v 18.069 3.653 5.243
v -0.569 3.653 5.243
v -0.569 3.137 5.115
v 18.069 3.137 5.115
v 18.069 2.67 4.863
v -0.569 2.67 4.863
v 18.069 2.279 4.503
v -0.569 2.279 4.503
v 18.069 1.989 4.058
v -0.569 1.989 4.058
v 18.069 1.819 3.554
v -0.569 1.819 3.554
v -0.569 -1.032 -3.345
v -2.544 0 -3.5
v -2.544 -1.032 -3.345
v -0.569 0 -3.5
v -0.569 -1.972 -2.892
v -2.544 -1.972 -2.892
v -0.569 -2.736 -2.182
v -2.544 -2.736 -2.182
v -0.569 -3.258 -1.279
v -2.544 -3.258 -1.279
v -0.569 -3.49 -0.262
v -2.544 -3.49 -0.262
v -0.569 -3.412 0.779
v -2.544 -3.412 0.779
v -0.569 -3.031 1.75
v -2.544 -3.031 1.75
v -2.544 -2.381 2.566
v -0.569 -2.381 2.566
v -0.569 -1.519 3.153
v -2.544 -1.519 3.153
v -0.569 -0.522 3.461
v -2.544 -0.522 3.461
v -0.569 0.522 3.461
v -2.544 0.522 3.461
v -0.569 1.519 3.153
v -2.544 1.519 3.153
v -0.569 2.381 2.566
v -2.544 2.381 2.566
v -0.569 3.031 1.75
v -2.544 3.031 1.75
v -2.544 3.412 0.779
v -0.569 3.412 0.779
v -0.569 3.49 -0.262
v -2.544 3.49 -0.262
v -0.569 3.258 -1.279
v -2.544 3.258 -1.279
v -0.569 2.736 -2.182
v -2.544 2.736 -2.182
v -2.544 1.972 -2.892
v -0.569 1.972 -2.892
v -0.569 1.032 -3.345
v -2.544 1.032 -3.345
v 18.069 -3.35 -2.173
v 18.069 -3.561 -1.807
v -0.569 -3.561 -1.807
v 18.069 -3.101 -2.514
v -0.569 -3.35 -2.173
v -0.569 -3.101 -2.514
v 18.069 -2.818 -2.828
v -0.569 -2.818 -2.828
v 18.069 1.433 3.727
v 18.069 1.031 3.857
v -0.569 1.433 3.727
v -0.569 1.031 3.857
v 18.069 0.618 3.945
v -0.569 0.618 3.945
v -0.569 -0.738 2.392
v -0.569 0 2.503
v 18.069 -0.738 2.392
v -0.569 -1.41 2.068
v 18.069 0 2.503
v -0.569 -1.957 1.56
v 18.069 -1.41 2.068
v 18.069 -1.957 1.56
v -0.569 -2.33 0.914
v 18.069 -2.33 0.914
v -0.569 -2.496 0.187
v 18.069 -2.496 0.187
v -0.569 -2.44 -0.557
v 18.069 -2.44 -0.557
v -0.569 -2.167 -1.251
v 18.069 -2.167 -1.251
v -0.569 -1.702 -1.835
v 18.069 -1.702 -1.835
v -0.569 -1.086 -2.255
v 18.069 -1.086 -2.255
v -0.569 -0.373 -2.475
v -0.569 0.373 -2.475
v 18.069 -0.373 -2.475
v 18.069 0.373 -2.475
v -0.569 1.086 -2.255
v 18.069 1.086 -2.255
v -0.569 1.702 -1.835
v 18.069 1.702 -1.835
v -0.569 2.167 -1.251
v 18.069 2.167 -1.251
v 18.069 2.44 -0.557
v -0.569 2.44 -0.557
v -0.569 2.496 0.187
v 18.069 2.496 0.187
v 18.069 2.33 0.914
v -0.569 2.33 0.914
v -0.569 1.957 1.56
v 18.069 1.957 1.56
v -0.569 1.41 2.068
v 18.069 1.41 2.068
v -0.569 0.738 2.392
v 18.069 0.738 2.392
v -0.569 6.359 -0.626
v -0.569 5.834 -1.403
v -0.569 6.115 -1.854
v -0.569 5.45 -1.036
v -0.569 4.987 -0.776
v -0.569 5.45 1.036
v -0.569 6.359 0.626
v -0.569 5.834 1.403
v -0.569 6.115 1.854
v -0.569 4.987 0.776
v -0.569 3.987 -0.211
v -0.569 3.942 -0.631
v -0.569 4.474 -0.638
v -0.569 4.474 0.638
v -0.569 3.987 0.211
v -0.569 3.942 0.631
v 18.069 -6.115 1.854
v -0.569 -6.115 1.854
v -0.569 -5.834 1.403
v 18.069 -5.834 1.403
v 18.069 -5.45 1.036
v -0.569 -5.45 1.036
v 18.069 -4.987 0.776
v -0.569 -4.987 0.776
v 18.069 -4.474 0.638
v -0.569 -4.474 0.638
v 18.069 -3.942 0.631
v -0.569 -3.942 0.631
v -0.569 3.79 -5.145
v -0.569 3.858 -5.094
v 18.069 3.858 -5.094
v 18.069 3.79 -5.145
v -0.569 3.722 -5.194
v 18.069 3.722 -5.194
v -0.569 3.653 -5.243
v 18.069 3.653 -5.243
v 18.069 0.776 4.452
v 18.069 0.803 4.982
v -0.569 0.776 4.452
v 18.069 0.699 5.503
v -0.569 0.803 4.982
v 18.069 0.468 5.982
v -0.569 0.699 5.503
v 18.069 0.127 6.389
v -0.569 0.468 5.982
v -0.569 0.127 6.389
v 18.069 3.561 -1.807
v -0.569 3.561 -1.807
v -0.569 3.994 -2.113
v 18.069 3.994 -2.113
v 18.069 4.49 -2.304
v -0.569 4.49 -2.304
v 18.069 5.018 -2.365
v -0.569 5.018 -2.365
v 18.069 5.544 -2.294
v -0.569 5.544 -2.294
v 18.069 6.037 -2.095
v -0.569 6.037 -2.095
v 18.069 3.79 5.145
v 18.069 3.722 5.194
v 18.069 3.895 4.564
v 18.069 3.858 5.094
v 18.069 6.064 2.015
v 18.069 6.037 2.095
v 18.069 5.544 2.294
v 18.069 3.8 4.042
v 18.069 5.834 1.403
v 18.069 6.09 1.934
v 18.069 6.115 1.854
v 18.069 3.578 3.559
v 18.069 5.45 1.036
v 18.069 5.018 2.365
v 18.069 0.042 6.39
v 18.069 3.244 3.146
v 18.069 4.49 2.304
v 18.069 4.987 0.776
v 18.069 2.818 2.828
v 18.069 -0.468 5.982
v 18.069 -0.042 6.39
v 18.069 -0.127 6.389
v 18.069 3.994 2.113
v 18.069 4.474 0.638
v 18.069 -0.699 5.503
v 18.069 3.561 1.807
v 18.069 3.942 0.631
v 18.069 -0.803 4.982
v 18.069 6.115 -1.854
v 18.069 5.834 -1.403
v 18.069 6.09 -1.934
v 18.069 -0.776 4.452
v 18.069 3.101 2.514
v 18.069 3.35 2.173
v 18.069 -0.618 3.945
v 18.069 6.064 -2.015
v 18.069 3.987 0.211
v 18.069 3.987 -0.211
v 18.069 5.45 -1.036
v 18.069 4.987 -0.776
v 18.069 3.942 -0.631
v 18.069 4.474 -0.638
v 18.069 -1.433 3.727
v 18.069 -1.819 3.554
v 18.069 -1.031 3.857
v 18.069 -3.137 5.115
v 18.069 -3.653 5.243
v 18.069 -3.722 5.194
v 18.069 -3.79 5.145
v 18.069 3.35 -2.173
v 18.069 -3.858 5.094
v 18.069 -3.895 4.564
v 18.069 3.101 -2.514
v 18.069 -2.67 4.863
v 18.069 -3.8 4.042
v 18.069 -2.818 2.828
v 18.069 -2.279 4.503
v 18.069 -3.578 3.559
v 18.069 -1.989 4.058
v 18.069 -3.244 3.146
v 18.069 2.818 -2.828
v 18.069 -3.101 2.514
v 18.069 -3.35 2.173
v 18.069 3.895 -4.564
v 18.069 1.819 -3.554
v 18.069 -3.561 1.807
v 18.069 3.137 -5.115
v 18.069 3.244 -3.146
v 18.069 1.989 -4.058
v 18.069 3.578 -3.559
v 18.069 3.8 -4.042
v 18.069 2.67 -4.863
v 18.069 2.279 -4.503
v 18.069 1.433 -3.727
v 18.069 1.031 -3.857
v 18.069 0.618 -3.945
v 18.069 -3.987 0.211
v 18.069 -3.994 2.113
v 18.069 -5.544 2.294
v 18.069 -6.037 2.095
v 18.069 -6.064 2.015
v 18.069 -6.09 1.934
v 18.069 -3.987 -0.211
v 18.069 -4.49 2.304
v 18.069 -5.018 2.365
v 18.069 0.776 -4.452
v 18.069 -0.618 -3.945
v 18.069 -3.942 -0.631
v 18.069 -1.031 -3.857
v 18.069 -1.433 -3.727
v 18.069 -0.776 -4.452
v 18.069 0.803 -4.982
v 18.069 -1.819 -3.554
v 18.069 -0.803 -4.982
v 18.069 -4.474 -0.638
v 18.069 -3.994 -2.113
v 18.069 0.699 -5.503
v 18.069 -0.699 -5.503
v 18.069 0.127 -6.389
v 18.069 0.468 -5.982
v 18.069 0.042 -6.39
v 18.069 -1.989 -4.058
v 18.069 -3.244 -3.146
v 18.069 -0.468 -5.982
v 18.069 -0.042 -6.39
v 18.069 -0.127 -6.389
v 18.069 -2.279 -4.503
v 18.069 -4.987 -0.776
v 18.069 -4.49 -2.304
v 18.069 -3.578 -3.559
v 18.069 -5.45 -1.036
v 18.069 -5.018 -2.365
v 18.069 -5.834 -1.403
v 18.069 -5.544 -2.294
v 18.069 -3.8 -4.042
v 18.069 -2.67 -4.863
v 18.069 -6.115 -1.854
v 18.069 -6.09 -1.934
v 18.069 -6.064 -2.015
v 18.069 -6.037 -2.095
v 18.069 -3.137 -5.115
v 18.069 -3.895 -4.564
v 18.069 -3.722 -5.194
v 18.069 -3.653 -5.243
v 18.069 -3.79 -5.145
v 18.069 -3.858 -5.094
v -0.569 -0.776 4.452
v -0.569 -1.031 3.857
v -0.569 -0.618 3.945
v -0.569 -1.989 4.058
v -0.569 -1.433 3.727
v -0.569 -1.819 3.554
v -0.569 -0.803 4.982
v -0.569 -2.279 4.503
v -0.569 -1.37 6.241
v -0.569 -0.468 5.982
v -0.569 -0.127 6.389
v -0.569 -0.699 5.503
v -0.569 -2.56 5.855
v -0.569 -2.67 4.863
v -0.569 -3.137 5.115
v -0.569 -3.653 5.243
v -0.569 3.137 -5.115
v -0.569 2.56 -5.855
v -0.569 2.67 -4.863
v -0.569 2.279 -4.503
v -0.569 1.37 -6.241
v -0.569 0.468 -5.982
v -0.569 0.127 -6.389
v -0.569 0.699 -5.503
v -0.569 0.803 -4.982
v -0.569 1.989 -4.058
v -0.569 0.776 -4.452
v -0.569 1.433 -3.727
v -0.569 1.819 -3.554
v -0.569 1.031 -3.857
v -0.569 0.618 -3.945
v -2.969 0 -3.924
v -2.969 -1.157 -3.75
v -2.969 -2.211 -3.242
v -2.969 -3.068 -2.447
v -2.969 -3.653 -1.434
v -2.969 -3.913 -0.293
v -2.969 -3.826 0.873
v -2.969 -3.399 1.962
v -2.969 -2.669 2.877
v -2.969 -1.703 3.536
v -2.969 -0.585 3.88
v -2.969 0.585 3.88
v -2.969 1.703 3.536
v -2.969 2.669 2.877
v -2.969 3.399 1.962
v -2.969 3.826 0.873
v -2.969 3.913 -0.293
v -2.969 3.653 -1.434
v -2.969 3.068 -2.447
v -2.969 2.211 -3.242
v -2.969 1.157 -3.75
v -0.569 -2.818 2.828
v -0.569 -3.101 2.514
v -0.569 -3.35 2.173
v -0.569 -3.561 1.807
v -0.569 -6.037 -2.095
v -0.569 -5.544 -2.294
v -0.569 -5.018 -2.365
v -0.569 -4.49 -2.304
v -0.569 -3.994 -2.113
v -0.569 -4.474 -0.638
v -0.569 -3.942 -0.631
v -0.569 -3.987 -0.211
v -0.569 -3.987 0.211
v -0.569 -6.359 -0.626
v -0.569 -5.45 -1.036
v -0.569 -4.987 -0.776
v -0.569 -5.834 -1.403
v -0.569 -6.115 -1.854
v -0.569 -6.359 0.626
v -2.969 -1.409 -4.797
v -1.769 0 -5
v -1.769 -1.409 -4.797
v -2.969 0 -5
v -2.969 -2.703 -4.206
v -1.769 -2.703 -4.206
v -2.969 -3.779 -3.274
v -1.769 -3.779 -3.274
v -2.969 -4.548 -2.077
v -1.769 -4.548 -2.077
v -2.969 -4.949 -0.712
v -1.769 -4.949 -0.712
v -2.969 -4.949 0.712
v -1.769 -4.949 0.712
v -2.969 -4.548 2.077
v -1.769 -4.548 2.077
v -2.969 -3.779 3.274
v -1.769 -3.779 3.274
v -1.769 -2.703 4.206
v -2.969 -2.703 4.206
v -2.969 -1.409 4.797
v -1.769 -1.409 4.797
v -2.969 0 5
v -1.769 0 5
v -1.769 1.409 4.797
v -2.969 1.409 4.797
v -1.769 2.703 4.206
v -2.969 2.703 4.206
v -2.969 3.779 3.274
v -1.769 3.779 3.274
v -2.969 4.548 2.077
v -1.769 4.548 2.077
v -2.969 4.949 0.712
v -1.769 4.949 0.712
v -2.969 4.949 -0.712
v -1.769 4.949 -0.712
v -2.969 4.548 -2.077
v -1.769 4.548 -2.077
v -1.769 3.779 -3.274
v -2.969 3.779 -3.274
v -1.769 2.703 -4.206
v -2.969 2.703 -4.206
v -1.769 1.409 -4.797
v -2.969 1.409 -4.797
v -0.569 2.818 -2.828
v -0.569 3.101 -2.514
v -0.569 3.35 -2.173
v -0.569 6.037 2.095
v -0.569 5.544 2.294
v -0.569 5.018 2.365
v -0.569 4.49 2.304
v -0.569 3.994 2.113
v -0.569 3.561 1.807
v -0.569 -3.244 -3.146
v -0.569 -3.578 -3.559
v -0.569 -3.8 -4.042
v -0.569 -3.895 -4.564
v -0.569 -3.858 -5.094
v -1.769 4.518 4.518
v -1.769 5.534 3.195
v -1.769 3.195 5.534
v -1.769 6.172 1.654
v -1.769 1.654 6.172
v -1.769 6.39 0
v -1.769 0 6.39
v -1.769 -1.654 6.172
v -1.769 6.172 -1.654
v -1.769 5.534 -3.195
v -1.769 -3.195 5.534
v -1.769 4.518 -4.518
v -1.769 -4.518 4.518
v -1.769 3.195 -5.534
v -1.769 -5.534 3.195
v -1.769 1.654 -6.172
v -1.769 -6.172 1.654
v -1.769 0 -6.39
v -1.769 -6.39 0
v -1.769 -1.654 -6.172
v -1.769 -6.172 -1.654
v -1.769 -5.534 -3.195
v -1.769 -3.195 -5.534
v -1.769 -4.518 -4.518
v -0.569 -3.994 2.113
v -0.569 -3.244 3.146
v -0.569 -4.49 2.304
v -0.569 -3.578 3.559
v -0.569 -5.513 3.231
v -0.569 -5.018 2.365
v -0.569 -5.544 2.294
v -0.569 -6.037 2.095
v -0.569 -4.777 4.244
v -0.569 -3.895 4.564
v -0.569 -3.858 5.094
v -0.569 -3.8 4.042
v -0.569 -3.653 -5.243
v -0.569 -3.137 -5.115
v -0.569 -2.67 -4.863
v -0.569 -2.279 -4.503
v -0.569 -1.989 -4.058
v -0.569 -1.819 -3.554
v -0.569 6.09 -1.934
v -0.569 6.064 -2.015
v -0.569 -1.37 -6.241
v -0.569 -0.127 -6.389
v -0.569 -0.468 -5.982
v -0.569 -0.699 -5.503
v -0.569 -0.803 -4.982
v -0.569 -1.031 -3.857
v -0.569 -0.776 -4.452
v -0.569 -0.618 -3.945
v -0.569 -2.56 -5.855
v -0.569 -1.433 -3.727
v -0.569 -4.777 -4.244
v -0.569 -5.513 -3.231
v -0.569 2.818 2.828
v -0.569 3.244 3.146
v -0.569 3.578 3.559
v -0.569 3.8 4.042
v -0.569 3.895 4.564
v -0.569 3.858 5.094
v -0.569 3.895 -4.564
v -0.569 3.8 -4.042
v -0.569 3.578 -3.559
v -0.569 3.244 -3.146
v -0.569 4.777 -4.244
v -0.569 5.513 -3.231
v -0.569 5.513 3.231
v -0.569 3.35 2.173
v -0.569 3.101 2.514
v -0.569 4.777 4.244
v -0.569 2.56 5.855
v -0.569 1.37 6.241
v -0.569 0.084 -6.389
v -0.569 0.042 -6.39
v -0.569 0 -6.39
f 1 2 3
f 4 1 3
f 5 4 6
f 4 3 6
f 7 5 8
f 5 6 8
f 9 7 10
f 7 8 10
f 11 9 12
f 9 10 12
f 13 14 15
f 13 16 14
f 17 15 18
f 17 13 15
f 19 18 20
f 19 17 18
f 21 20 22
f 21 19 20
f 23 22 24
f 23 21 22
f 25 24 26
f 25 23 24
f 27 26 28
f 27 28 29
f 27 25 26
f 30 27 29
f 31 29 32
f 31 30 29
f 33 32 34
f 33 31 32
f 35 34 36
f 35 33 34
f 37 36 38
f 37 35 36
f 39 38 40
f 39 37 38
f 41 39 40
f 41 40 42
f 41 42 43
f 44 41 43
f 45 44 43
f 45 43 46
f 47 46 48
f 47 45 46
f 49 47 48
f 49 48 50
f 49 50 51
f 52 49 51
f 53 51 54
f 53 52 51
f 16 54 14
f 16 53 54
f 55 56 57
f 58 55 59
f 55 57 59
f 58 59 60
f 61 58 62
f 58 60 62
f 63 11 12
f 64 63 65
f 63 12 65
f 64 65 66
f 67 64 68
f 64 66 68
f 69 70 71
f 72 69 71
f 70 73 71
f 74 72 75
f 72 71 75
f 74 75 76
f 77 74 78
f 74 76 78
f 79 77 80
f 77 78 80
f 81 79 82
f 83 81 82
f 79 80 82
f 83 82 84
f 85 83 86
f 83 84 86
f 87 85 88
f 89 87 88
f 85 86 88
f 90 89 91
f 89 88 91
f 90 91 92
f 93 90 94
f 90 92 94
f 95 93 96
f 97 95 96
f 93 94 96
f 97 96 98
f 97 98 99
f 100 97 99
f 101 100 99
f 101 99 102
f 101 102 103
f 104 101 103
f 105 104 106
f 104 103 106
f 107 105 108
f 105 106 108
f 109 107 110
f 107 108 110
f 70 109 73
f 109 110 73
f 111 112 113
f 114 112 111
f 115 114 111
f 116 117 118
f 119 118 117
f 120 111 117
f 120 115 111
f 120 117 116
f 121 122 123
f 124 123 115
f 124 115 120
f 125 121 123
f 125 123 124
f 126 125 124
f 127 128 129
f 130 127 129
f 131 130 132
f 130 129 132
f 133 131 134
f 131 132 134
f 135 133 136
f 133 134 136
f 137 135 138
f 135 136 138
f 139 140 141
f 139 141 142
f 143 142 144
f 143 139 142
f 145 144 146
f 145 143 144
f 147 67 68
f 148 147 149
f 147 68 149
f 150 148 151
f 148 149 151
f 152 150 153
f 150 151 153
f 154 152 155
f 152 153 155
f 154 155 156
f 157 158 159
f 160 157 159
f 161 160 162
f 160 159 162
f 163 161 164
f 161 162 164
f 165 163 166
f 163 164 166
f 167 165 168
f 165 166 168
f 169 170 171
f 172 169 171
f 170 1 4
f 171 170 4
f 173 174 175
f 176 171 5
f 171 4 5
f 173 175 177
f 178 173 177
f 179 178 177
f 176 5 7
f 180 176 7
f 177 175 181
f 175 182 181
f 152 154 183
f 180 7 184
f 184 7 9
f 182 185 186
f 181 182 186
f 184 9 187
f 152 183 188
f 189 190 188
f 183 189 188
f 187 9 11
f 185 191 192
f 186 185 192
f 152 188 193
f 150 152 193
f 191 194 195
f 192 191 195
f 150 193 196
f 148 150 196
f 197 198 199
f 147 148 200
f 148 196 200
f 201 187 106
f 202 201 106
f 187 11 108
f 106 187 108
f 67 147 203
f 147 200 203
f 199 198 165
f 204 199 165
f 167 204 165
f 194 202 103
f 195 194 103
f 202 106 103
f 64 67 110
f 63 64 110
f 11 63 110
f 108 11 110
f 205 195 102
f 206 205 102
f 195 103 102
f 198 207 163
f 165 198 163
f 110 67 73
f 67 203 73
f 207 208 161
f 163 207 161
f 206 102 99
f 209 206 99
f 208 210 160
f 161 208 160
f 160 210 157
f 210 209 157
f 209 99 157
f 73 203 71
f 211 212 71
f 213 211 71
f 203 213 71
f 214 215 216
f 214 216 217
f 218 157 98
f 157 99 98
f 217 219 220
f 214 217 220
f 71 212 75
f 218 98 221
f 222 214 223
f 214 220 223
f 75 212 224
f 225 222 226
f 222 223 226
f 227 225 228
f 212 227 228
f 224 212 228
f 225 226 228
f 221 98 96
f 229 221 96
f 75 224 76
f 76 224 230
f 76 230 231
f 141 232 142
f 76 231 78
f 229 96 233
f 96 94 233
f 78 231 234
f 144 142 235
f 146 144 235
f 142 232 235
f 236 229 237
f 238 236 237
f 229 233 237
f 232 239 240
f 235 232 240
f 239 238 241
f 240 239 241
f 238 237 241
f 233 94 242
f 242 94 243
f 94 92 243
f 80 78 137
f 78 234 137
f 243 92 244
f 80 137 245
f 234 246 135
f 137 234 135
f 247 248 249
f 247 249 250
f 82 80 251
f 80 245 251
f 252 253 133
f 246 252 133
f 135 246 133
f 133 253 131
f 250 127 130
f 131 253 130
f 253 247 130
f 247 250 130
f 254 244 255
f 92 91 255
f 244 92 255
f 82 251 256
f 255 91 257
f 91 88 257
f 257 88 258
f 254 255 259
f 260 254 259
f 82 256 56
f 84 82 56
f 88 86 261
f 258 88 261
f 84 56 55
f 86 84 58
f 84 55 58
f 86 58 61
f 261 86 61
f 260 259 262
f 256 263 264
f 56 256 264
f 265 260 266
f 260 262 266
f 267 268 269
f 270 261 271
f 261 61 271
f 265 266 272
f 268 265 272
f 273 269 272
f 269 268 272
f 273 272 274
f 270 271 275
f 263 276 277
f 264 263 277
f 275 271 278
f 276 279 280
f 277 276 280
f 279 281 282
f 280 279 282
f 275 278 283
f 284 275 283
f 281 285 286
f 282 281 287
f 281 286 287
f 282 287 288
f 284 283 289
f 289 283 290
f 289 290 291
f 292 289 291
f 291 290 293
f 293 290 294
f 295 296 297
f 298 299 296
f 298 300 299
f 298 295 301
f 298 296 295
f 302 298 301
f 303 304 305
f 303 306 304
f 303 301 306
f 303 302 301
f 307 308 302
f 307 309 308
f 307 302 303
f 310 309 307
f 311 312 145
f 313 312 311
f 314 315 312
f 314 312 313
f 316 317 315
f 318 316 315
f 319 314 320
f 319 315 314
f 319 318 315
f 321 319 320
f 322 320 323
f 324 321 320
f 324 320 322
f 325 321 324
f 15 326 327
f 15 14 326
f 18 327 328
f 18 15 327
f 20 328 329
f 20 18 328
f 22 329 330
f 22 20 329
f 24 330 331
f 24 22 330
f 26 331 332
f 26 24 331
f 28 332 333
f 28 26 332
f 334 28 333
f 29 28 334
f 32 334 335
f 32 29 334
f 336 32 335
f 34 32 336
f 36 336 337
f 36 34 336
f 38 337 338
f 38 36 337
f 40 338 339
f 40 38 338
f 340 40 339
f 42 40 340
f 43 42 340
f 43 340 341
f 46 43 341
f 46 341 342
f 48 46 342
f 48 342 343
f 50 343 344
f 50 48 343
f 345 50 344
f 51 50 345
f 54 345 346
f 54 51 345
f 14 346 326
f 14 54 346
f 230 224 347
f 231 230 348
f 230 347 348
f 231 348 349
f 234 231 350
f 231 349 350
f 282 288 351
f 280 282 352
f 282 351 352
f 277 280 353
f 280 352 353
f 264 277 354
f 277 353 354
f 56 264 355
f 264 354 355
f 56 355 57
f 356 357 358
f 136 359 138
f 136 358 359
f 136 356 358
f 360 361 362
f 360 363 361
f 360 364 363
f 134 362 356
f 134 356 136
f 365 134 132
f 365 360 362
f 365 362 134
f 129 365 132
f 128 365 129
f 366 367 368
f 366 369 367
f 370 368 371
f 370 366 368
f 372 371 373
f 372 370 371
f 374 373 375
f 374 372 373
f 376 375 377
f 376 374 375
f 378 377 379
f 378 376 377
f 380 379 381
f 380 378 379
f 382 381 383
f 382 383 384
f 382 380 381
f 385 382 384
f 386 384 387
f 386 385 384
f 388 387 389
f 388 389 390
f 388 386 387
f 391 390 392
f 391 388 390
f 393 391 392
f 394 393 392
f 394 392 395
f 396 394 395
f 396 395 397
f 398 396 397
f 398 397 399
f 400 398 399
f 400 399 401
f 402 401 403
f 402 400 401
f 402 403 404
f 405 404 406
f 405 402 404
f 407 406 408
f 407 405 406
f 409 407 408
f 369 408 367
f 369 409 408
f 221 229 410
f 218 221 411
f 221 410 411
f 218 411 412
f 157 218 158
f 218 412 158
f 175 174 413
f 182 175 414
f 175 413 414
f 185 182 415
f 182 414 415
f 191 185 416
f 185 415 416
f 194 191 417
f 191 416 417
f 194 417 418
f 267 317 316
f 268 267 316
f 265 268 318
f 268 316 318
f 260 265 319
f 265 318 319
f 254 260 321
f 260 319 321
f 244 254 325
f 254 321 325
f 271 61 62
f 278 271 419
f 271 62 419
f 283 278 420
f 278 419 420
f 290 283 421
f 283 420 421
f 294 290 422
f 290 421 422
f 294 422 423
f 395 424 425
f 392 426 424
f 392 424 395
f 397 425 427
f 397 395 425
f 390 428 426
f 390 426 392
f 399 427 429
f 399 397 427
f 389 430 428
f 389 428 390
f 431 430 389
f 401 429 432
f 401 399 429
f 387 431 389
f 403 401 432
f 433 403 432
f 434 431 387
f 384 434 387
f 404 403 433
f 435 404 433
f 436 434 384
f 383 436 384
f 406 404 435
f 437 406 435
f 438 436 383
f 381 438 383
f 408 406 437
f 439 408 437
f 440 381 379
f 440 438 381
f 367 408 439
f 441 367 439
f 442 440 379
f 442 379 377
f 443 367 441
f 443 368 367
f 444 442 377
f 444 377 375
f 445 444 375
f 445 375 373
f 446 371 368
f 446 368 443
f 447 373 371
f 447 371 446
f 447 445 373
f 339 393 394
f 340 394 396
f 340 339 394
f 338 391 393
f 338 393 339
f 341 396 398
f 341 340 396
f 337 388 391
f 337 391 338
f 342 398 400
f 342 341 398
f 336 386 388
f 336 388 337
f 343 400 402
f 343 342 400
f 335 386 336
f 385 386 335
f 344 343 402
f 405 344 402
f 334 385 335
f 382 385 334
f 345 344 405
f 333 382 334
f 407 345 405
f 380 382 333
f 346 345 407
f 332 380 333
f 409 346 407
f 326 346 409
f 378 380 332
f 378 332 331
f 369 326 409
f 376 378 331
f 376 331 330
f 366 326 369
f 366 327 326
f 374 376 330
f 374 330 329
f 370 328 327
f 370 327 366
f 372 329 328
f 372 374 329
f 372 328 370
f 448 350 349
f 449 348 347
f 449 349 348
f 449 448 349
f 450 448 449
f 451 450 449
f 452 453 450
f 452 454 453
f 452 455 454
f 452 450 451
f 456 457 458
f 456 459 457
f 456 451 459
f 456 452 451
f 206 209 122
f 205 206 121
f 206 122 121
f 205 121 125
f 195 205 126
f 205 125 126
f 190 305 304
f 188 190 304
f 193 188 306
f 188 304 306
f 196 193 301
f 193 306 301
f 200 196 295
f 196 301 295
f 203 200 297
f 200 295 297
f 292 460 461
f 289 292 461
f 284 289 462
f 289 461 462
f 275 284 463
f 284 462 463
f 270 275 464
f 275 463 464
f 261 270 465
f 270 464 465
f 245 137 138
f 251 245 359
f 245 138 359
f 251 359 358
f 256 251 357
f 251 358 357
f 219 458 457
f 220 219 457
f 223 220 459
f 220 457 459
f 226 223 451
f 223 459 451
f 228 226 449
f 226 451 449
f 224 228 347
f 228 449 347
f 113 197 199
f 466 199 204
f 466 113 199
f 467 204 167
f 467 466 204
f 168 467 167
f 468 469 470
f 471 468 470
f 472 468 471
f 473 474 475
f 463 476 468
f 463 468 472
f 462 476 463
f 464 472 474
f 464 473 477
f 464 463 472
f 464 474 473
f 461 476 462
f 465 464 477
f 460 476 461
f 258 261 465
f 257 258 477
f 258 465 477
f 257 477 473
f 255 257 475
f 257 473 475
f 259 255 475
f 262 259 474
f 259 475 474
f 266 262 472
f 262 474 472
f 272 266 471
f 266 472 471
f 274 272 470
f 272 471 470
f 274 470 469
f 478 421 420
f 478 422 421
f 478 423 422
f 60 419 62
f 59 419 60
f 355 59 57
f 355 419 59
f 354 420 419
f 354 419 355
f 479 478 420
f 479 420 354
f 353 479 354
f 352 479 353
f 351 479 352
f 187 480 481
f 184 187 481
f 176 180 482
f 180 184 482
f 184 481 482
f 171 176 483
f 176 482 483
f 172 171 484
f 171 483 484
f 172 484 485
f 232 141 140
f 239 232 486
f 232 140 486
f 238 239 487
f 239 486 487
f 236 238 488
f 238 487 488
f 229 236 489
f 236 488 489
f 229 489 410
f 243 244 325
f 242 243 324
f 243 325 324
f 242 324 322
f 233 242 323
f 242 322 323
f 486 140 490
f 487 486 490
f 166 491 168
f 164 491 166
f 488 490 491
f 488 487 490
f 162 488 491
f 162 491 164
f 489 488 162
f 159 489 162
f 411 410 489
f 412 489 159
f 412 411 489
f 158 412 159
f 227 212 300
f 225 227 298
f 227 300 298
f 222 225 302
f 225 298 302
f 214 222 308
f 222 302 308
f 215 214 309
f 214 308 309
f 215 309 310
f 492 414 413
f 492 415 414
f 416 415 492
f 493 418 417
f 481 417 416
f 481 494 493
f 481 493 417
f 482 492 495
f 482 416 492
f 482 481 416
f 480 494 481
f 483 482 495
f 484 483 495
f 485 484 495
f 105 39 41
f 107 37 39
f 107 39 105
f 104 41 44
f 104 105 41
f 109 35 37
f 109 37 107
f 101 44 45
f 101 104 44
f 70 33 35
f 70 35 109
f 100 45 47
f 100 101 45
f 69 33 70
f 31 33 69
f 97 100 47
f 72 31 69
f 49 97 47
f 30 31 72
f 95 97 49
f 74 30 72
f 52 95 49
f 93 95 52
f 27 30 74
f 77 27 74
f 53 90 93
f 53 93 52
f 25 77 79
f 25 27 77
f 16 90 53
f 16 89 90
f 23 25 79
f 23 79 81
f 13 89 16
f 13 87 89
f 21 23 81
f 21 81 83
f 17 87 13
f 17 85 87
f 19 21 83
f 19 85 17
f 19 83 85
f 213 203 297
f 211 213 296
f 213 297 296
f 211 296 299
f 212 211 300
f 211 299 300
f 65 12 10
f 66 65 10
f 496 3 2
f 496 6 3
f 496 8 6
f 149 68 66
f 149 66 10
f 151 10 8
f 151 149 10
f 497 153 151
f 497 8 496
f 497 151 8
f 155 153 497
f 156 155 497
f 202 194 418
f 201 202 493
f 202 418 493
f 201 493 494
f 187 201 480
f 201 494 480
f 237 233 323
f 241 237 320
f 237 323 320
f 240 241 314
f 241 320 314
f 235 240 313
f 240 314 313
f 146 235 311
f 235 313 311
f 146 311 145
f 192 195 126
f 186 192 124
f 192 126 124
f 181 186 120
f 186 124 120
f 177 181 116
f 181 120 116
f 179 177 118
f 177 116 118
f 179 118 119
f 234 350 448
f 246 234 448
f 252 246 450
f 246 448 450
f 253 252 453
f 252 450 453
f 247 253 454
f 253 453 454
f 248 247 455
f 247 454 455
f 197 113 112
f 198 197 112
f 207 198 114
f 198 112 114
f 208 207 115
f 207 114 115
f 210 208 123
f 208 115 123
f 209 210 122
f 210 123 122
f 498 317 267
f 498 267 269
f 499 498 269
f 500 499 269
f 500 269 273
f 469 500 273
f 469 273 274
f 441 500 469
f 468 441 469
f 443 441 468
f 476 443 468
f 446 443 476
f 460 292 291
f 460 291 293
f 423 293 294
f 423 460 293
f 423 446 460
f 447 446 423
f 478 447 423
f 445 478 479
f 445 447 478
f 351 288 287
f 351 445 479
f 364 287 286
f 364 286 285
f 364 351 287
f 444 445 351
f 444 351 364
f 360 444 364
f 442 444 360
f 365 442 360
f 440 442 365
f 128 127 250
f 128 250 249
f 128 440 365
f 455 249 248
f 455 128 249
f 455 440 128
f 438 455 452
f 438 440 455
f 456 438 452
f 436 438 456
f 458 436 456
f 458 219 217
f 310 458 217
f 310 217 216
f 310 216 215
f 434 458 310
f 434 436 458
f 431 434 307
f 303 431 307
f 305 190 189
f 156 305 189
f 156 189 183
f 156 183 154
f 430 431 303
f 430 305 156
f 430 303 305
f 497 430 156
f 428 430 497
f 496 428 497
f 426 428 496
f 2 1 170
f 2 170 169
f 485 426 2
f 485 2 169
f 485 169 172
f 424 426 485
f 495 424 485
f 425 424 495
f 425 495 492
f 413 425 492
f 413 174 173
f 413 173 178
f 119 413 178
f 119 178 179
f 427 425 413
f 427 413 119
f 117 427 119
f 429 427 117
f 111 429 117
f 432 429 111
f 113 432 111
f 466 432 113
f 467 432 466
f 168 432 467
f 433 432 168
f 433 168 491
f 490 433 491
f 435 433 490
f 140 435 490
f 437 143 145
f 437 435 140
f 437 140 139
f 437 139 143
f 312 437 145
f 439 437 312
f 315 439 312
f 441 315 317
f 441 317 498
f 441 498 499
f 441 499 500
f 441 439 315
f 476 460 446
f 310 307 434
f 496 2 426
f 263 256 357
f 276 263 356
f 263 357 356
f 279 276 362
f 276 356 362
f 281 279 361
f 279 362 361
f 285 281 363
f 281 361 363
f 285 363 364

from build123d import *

# Parameters (mm, degrees)
BASPROSKE_W     = 17.5
BASPROSKE_H     = 6
TOOTHCUT_DEPTH  = 20.448650339
TEETHCUTS_COUNT = 10
TEETHCUTS_ANGLE = 324
BORSKE_R        = 2.35
BORE_DEPTH      = 50.0000508
SCALE_1_SCALE   = 1.065


with BuildPart() as part:
    # BasProSke → Base-Revolve (revolve)
    with BuildSketch(Plane(origin=(0, 0, 0), x_dir=(1, 0, 0), z_dir=(0, 1, 0)), mode=Mode.PRIVATE) as base_revolve_sk:
        with Locations((8.75, 3)):
            Rectangle(BASPROSKE_W, BASPROSKE_H)
    revolve(base_revolve_sk.sketch.rotate(Axis((-10, 0, 0), (1, 0, 0)), 180), axis=Axis((-10, 0, 0), (1, 0, 0)))

    # TooCutSke → ToothCut (cut, through all)
    with BuildSketch(Plane(origin=(0, 0, 0), x_dir=(0, 0, -1), z_dir=(1, 0, 0))):
        with BuildLine():
            ThreePointArc((0.59278292, 3.701838653), (0, 3.749), (-0.59278292, 3.701838653))
            ThreePointArc((-0.59278292, 3.701838653), (-0.846593509, 4.924114224), (-1.775771316, 5.757784417))
            ThreePointArc((-1.775771316, 5.757784417), (0, 6.0254), (1.775771316, 5.757784417))
            ThreePointArc((1.775771316, 5.757784417), (0.846593509, 4.924114224), (0.59278292, 3.701838653))
        make_face()
    toothcut = extrude(amount=TOOTHCUT_DEPTH, mode=Mode.SUBTRACT)

    # TeethCuts: ToothCut ×10 about axis
    teethcuts_axis = Axis((-10, 0, 0), (1, 0, 0))
    for i in range(1, TEETHCUTS_COUNT):
        add(toothcut.rotate(teethcuts_axis, i * TEETHCUTS_ANGLE / (TEETHCUTS_COUNT - 1)), mode=Mode.SUBTRACT)

    # BorSke → Bore (cut, symmetric)
    with BuildSketch(Plane(origin=(0, 0, 0), x_dir=(0, 0, -1), z_dir=(1, 0, 0))):
        with Locations(Location((0, 0, 0), (0, 0, 180))):
            Circle(BORSKE_R)
    extrude(amount=BORE_DEPTH, both=True, mode=Mode.SUBTRACT)


with BuildPart() as part_1:
    # Масштаб1: scaled about (8.75, 0, 0)
    add(part.part.scale(SCALE_1_SCALE).moved(Location((-0.56875, 0, 0))))

    # Эскиз2 → Повернуть1 (revolve)
    with BuildSketch(Plane(origin=(0, 0, 0), x_dir=(1, 0, 0), z_dir=(0, 1, 0))):
        Polygon((-0.56875, 3.5), (-0.56875, 6.39), (-1.76875, 6.39), (-1.76875, 5), (-2.96875, 5), (-2.96875, 3.924264069), (-2.544485931, 3.5), align=None)
    revolve(axis=Axis((0, 0, 0), (-1, 0, 0)))


solid = part_1.part
